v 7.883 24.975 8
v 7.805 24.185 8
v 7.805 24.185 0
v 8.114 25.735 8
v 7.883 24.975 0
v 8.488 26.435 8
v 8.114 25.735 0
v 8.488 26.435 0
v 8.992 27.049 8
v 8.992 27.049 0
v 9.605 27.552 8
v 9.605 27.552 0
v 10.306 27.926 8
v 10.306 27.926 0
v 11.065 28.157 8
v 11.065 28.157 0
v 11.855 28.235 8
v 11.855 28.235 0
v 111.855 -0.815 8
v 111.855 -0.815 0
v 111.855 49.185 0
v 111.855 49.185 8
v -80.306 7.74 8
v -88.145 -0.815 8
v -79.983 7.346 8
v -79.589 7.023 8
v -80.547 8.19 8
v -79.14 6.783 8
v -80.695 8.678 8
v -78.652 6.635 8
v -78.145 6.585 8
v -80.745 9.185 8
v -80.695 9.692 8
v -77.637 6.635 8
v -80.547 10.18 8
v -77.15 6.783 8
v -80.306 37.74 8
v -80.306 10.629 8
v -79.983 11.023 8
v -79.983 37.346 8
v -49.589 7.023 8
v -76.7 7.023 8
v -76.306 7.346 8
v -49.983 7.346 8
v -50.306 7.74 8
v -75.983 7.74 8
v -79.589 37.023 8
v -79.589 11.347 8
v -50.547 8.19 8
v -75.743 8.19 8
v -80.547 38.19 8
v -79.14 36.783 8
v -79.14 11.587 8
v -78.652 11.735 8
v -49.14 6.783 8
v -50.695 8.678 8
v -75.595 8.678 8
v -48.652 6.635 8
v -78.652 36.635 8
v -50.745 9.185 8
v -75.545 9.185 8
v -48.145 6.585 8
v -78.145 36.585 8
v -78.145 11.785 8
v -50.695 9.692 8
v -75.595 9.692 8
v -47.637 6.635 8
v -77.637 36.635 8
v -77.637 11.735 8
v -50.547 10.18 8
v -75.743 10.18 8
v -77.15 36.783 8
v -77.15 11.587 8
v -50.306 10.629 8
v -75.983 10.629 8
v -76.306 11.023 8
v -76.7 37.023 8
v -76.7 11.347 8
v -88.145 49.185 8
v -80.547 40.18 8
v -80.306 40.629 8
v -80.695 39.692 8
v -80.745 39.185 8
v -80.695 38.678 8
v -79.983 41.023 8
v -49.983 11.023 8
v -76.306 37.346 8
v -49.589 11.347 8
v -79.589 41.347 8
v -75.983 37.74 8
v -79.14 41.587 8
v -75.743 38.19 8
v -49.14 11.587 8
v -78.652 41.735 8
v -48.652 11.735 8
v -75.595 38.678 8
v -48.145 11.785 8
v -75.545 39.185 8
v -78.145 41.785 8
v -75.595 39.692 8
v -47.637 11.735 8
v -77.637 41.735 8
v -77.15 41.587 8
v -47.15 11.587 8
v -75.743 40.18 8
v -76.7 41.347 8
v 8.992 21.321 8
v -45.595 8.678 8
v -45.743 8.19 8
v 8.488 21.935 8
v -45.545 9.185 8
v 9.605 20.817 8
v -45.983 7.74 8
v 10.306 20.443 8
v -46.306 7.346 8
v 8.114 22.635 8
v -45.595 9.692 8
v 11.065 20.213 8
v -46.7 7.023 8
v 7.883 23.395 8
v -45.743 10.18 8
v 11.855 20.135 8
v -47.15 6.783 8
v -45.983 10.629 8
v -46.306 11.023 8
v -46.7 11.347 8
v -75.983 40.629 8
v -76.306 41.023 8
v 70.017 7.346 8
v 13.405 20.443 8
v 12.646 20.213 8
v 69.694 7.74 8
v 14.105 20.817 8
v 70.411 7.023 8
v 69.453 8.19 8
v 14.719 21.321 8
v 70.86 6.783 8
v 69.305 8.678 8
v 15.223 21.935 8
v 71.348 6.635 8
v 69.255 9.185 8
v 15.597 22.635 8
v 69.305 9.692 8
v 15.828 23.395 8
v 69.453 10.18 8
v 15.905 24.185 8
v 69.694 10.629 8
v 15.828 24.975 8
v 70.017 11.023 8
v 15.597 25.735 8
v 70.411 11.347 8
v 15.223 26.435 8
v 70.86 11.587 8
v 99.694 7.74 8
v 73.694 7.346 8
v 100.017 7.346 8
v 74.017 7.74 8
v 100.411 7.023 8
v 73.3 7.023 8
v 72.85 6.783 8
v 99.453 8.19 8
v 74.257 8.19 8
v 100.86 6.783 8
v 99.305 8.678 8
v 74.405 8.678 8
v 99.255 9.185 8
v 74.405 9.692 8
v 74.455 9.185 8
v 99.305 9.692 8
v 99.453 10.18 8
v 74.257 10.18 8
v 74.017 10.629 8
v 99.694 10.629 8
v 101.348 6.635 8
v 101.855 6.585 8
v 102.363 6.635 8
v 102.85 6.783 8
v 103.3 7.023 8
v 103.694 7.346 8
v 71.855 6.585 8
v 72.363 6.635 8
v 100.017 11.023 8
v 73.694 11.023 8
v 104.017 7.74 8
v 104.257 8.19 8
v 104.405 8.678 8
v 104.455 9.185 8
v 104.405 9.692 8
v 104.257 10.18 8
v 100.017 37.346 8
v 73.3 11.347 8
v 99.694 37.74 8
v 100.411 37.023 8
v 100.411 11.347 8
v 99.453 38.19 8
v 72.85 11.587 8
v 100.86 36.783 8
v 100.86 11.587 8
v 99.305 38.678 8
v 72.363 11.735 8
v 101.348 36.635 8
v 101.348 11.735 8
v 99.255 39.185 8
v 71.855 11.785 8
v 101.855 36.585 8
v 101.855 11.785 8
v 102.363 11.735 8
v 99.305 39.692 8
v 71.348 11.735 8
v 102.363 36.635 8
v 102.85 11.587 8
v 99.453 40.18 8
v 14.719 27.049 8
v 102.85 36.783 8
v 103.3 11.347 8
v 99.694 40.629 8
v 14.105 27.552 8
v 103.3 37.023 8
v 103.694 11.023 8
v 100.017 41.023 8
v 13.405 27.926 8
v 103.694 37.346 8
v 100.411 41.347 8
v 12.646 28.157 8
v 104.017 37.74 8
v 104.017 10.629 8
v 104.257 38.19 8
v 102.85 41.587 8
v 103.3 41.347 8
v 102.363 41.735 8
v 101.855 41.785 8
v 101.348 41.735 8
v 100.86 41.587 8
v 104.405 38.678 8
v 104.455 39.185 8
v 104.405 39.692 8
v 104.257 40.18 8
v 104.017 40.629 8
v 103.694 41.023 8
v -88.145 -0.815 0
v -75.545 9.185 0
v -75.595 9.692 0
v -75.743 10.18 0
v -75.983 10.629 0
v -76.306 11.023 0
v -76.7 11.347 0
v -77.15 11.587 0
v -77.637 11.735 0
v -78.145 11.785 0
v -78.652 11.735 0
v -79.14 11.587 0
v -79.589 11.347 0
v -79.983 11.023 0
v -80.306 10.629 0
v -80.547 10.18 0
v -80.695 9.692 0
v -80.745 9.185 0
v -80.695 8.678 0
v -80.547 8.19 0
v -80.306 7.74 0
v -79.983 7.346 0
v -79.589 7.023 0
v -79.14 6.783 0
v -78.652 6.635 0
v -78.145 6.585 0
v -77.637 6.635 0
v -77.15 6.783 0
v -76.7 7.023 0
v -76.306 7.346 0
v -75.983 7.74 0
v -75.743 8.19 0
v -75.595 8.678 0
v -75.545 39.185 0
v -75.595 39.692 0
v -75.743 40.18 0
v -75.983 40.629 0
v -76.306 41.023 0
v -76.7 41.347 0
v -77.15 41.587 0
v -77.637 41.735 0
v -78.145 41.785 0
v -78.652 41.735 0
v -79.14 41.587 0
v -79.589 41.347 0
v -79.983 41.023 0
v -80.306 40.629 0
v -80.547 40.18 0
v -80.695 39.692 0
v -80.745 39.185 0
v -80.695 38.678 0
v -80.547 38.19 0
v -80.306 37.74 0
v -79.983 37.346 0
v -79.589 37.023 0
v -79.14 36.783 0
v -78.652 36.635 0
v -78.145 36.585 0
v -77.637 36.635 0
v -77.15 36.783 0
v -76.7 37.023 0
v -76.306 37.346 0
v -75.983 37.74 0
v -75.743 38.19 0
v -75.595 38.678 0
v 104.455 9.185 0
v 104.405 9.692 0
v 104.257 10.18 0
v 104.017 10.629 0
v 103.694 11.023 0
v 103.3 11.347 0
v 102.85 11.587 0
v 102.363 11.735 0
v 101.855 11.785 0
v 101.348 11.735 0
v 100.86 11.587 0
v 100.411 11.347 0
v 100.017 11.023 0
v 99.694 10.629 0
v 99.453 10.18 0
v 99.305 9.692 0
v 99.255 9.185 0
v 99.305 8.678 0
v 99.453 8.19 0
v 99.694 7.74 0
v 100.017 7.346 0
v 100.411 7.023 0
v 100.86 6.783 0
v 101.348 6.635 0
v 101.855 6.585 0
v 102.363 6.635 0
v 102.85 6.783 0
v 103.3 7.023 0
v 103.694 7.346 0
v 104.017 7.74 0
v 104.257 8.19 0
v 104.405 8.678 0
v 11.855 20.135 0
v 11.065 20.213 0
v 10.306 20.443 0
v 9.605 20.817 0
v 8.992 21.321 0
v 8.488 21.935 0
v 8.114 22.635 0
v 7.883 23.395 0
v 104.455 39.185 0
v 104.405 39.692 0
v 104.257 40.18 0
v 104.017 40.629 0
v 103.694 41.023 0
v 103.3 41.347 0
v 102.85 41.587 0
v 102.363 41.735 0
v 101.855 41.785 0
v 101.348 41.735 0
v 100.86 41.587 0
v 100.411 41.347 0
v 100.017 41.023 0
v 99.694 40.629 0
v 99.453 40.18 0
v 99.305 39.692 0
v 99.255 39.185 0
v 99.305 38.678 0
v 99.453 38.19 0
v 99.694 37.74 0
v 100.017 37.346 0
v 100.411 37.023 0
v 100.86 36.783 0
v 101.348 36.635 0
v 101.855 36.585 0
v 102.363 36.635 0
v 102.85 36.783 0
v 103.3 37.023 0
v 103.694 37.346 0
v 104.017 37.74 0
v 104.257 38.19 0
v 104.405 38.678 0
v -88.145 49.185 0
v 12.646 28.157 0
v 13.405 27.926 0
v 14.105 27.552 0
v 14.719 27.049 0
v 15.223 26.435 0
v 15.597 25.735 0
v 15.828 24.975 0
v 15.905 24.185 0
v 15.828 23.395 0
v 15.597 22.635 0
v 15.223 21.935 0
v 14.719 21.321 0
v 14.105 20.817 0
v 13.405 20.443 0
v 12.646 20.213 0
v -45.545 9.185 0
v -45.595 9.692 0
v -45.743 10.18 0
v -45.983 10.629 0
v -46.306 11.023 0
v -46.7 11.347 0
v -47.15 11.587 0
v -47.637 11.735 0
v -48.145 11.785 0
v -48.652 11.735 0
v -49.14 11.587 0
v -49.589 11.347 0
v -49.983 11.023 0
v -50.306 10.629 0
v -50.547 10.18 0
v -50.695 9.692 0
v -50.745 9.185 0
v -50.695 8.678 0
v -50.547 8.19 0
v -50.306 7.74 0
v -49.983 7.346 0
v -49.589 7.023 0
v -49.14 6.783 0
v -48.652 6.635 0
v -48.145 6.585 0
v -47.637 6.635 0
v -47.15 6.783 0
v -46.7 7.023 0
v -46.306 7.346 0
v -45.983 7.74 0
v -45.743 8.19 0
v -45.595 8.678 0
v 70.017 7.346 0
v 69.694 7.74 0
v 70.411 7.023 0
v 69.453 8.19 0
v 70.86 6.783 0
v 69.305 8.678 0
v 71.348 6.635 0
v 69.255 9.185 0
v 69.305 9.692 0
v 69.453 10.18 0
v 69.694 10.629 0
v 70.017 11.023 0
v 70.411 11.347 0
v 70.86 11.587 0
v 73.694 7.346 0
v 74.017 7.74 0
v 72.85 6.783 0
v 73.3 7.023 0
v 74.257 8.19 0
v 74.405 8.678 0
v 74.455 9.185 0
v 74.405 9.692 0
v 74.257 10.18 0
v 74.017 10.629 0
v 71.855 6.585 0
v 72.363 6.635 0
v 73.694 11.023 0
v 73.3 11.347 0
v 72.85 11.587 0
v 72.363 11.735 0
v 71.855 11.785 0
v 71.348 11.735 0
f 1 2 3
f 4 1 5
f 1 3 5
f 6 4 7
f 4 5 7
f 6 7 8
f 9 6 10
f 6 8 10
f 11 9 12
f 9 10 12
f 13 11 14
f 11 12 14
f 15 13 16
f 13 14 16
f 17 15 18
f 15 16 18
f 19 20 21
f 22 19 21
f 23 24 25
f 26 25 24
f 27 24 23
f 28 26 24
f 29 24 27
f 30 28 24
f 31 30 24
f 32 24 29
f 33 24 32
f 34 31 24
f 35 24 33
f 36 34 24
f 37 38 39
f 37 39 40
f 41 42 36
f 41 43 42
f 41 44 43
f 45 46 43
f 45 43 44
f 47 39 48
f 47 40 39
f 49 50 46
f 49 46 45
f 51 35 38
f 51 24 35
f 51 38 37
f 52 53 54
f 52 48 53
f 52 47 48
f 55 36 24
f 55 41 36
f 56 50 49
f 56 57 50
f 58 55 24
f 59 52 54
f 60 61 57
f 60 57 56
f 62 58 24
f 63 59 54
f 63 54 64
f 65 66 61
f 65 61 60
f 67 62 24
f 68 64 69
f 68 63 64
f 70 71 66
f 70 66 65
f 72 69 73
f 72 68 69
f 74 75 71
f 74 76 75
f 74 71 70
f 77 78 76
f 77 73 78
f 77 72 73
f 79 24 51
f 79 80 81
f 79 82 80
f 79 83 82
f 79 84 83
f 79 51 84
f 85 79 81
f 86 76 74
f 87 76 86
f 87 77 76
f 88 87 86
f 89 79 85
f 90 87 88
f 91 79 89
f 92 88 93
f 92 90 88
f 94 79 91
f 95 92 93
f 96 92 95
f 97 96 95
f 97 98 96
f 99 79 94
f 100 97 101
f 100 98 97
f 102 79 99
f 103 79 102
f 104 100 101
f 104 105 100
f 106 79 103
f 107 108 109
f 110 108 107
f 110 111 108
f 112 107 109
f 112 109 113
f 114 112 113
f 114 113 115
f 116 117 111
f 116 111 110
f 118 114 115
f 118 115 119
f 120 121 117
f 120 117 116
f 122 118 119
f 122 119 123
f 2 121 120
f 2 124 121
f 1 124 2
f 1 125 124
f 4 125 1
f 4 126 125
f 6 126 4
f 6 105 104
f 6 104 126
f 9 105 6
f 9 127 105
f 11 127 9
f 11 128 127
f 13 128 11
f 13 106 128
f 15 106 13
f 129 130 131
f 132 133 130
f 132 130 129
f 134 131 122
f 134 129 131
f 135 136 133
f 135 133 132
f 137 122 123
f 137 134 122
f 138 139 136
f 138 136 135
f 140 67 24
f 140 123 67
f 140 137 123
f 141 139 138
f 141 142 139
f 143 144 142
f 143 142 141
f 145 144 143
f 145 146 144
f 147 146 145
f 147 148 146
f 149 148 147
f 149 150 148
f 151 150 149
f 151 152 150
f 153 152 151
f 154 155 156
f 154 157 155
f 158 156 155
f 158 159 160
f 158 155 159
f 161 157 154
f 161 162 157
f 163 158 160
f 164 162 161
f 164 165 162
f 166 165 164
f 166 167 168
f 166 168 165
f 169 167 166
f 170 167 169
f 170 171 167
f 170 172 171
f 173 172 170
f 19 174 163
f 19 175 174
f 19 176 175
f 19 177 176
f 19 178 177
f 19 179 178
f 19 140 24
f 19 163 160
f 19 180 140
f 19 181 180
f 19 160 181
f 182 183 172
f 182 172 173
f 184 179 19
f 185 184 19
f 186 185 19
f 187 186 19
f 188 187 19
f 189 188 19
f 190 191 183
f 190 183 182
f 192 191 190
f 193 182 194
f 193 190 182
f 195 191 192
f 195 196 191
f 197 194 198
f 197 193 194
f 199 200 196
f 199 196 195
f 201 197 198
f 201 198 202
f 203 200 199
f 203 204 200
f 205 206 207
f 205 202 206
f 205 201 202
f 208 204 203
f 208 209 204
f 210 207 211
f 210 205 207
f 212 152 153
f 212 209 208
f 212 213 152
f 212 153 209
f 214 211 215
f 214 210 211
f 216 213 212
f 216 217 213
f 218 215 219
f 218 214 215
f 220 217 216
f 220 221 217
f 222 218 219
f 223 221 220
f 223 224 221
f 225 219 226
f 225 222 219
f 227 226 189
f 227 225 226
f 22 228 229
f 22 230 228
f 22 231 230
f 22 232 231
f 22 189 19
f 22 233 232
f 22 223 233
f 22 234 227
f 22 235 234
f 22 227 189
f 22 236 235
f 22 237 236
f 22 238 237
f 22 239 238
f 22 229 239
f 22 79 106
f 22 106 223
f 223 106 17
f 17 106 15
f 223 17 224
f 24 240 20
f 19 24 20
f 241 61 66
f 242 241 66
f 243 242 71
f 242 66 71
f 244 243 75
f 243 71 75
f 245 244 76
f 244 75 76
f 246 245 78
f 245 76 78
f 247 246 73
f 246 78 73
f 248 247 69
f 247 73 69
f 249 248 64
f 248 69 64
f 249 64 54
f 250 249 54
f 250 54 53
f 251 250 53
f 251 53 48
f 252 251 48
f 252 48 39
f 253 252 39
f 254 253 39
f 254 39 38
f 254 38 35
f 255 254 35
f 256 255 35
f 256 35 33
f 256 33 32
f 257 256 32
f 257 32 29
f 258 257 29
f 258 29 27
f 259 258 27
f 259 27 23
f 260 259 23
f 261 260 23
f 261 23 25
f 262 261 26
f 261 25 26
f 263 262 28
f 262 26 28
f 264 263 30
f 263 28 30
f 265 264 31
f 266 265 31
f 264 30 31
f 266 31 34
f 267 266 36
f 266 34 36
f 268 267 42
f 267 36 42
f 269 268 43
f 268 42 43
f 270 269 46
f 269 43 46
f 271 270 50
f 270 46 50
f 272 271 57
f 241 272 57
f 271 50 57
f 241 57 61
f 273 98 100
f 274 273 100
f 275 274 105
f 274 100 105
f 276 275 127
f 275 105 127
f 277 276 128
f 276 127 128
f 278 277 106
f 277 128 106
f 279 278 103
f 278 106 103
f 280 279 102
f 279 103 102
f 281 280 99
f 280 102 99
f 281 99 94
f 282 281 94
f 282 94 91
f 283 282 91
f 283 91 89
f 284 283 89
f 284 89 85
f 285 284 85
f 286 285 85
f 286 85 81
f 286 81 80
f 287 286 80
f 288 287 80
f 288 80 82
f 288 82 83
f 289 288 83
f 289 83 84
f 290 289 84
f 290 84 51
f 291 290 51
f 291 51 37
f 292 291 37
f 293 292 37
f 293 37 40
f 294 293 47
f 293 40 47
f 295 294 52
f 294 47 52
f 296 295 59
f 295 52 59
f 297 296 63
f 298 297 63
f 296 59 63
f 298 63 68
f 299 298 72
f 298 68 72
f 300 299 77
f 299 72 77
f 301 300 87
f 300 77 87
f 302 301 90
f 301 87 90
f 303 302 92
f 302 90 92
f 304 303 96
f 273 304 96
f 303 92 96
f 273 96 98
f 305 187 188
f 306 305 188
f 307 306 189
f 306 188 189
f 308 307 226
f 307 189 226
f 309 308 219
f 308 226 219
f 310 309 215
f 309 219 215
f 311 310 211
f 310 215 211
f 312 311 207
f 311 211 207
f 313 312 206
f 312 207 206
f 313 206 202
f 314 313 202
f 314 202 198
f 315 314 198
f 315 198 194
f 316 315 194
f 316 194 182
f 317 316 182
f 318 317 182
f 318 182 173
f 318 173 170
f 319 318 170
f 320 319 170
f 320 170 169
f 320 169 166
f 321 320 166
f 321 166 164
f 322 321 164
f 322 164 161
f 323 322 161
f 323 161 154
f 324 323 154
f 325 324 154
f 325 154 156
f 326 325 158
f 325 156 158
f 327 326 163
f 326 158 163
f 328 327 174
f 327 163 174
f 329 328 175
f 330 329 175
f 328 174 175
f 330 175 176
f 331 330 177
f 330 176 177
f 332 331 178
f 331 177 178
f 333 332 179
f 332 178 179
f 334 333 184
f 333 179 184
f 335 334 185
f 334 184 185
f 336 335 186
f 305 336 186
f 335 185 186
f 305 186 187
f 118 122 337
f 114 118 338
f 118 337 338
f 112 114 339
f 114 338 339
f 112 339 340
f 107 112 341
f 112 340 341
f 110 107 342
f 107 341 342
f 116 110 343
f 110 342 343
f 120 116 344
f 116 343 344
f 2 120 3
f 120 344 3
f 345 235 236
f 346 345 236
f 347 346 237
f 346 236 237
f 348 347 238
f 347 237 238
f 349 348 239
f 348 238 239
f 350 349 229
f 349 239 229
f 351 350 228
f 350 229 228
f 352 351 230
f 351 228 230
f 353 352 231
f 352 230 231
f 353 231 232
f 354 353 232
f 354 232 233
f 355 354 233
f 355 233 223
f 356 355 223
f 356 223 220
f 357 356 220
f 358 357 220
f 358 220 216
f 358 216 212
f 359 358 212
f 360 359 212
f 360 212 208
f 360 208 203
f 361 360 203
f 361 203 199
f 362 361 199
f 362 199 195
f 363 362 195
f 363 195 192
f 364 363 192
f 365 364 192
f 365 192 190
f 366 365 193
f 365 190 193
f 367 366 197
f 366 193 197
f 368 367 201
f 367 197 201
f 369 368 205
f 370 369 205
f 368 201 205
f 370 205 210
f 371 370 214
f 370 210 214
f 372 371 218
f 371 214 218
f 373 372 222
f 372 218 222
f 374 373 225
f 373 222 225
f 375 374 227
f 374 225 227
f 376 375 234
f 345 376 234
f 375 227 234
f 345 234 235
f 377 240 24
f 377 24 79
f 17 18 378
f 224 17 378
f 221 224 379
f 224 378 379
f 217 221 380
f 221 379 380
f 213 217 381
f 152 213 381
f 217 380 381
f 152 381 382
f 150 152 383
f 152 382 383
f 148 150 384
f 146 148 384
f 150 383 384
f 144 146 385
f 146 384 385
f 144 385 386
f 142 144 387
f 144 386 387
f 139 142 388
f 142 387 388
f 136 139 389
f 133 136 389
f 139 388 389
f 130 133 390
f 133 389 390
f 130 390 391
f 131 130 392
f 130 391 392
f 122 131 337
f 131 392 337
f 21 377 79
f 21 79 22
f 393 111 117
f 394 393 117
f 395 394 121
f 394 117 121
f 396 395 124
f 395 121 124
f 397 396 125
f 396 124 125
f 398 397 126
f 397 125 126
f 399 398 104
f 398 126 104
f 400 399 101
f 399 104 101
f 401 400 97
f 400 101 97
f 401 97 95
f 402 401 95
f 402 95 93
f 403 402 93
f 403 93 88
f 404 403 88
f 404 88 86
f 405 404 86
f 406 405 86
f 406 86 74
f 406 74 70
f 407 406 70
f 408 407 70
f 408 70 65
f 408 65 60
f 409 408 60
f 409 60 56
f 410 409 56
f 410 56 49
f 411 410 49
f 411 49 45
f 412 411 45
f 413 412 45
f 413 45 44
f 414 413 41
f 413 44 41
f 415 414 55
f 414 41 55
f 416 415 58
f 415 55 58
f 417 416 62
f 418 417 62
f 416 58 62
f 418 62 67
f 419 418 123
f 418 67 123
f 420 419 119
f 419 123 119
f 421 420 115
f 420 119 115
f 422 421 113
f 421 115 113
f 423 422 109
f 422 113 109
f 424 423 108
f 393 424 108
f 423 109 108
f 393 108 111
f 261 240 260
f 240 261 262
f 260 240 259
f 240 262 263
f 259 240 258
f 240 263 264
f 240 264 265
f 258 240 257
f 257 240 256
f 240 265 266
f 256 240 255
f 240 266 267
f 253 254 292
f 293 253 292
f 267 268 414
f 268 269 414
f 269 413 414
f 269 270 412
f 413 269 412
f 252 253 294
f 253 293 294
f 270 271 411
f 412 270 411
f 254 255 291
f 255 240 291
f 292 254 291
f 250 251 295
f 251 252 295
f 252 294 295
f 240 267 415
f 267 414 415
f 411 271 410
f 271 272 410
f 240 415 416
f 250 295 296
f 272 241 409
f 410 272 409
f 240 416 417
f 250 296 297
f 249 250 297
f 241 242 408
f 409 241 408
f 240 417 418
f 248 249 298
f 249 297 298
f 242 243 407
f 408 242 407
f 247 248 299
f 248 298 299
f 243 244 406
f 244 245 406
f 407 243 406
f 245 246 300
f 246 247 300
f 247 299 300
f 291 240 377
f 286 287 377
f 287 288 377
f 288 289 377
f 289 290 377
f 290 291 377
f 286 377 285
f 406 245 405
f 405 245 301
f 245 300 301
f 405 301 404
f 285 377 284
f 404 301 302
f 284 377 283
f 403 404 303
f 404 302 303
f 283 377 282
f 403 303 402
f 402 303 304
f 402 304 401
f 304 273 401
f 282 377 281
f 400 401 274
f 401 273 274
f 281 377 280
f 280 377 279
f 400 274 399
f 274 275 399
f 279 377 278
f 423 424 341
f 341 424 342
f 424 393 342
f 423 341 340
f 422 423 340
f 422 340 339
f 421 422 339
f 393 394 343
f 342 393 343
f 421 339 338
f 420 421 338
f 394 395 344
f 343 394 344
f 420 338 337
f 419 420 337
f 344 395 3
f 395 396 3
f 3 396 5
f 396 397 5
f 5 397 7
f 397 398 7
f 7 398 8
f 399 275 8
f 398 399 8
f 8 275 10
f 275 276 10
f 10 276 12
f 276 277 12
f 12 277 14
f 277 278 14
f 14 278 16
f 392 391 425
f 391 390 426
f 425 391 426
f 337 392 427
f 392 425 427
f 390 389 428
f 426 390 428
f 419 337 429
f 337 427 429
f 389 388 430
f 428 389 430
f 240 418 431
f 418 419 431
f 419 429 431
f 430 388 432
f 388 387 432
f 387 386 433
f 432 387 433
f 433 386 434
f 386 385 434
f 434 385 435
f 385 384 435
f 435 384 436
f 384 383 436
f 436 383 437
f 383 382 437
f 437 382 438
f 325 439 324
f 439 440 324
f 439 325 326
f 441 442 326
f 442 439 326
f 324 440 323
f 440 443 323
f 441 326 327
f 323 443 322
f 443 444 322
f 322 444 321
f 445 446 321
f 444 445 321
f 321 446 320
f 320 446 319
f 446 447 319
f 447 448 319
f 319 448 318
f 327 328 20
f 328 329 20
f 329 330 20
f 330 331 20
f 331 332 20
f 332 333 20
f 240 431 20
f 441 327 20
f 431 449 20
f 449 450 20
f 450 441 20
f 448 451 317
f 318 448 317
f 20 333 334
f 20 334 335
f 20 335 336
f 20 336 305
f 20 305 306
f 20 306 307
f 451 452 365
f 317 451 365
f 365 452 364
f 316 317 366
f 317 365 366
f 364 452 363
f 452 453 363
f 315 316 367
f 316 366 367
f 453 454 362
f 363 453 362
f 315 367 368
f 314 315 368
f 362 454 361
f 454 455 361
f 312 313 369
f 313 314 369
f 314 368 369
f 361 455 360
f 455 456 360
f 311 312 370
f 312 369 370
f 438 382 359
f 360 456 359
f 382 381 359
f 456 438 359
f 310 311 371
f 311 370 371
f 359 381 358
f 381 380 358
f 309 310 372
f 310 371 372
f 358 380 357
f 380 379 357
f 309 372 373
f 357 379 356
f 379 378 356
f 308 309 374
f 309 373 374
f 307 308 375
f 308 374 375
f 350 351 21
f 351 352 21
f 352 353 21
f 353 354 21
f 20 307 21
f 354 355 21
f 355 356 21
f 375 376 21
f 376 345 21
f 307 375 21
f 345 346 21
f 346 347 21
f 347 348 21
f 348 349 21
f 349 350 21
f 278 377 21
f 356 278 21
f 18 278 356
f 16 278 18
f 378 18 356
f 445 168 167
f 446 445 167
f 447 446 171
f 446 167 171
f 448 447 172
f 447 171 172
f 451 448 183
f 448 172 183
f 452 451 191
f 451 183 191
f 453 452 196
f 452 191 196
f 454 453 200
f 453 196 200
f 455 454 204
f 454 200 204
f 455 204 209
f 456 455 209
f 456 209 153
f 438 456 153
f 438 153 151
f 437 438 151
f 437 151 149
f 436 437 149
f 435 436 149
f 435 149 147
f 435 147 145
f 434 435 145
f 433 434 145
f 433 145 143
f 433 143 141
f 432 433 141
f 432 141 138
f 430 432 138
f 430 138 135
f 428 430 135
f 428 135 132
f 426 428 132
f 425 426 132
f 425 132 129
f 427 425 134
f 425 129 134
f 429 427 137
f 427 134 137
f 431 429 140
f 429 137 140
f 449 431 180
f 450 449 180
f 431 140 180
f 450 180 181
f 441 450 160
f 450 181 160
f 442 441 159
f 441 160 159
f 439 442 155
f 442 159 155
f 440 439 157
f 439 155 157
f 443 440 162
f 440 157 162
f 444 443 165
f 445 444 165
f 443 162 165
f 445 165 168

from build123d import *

# Parameters (mm, degrees)
IZIM1_W                              = 200
IZIM1_H                              = 50
Y_KSEKLIK_EKSTR_ZYON1_DEPTH          = 8
M5_HELISARMAL_I_IN_Z_VANA_MATKAB_1_D = 5.2
M5_HELISARMAL_I_IN_Z_VANA_MATKAB_2_D = 5.2
KES_EKSTR_ZYON1_DEPTH                = 10


with BuildPart() as part:
    # Çizim1 → Yükseklik-Ekstrüzyon1 (new body)
    with BuildSketch(Plane.XY):
        with Locations((11.855409505, 24.184782609)):
            Rectangle(IZIM1_W, IZIM1_H)
    extrude(amount=Y_KSEKLIK_EKSTR_ZYON1_DEPTH)

    # M5 Helisarmal için Zıvana matkabı1 (through all)
    with Locations(Plane(origin=(0, 0, 0), x_dir=(-1, 0, 0), z_dir=(0, 0, -1))):
        with Locations((-101.855409505, 39.184782609), (-101.855409505, 9.184782609), (78.144590495, 9.184782609), (78.144590495, 39.184782609)):
            Hole(M5_HELISARMAL_I_IN_Z_VANA_MATKAB_1_D / 2)

    # M5 Helisarmal için Zıvana matkabı2 (through all)
    with Locations(Plane(origin=(71.855409505, 9.184782609, 0), x_dir=(-1, 0, 0), z_dir=(0, 0, -1))):
        with Locations((0, 0), (120, 0)):
            Hole(M5_HELISARMAL_I_IN_Z_VANA_MATKAB_2_D / 2)

    # Çizim8 → Kes-Ekstrüzyon1 (cut)
    with BuildSketch(Plane(origin=(0, 0, 0), x_dir=(-1, 0, 0), z_dir=(0, 0, -1))):
        with BuildLine():
            ThreePointArc((-7.805409505, 24.184782609), (-8.991627041, 27.048565073), (-11.855409505, 28.234782609))
            Line((-11.855409505, 28.234782609), (-11.855409505, 20.134782609))
            ThreePointArc((-11.855409505, 20.134782609), (-8.991627041, 21.321000145), (-7.805409505, 24.184782609))
        make_face()
        with BuildLine():
            Line((-11.855409505, 20.134782609), (-11.855409505, 28.234782609))
            ThreePointArc((-11.855409505, 28.234782609), (-15.905409505, 24.184782609), (-11.855409505, 20.134782609))
        make_face()
    extrude(amount=-KES_EKSTR_ZYON1_DEPTH, mode=Mode.SUBTRACT)


solid = part.part
